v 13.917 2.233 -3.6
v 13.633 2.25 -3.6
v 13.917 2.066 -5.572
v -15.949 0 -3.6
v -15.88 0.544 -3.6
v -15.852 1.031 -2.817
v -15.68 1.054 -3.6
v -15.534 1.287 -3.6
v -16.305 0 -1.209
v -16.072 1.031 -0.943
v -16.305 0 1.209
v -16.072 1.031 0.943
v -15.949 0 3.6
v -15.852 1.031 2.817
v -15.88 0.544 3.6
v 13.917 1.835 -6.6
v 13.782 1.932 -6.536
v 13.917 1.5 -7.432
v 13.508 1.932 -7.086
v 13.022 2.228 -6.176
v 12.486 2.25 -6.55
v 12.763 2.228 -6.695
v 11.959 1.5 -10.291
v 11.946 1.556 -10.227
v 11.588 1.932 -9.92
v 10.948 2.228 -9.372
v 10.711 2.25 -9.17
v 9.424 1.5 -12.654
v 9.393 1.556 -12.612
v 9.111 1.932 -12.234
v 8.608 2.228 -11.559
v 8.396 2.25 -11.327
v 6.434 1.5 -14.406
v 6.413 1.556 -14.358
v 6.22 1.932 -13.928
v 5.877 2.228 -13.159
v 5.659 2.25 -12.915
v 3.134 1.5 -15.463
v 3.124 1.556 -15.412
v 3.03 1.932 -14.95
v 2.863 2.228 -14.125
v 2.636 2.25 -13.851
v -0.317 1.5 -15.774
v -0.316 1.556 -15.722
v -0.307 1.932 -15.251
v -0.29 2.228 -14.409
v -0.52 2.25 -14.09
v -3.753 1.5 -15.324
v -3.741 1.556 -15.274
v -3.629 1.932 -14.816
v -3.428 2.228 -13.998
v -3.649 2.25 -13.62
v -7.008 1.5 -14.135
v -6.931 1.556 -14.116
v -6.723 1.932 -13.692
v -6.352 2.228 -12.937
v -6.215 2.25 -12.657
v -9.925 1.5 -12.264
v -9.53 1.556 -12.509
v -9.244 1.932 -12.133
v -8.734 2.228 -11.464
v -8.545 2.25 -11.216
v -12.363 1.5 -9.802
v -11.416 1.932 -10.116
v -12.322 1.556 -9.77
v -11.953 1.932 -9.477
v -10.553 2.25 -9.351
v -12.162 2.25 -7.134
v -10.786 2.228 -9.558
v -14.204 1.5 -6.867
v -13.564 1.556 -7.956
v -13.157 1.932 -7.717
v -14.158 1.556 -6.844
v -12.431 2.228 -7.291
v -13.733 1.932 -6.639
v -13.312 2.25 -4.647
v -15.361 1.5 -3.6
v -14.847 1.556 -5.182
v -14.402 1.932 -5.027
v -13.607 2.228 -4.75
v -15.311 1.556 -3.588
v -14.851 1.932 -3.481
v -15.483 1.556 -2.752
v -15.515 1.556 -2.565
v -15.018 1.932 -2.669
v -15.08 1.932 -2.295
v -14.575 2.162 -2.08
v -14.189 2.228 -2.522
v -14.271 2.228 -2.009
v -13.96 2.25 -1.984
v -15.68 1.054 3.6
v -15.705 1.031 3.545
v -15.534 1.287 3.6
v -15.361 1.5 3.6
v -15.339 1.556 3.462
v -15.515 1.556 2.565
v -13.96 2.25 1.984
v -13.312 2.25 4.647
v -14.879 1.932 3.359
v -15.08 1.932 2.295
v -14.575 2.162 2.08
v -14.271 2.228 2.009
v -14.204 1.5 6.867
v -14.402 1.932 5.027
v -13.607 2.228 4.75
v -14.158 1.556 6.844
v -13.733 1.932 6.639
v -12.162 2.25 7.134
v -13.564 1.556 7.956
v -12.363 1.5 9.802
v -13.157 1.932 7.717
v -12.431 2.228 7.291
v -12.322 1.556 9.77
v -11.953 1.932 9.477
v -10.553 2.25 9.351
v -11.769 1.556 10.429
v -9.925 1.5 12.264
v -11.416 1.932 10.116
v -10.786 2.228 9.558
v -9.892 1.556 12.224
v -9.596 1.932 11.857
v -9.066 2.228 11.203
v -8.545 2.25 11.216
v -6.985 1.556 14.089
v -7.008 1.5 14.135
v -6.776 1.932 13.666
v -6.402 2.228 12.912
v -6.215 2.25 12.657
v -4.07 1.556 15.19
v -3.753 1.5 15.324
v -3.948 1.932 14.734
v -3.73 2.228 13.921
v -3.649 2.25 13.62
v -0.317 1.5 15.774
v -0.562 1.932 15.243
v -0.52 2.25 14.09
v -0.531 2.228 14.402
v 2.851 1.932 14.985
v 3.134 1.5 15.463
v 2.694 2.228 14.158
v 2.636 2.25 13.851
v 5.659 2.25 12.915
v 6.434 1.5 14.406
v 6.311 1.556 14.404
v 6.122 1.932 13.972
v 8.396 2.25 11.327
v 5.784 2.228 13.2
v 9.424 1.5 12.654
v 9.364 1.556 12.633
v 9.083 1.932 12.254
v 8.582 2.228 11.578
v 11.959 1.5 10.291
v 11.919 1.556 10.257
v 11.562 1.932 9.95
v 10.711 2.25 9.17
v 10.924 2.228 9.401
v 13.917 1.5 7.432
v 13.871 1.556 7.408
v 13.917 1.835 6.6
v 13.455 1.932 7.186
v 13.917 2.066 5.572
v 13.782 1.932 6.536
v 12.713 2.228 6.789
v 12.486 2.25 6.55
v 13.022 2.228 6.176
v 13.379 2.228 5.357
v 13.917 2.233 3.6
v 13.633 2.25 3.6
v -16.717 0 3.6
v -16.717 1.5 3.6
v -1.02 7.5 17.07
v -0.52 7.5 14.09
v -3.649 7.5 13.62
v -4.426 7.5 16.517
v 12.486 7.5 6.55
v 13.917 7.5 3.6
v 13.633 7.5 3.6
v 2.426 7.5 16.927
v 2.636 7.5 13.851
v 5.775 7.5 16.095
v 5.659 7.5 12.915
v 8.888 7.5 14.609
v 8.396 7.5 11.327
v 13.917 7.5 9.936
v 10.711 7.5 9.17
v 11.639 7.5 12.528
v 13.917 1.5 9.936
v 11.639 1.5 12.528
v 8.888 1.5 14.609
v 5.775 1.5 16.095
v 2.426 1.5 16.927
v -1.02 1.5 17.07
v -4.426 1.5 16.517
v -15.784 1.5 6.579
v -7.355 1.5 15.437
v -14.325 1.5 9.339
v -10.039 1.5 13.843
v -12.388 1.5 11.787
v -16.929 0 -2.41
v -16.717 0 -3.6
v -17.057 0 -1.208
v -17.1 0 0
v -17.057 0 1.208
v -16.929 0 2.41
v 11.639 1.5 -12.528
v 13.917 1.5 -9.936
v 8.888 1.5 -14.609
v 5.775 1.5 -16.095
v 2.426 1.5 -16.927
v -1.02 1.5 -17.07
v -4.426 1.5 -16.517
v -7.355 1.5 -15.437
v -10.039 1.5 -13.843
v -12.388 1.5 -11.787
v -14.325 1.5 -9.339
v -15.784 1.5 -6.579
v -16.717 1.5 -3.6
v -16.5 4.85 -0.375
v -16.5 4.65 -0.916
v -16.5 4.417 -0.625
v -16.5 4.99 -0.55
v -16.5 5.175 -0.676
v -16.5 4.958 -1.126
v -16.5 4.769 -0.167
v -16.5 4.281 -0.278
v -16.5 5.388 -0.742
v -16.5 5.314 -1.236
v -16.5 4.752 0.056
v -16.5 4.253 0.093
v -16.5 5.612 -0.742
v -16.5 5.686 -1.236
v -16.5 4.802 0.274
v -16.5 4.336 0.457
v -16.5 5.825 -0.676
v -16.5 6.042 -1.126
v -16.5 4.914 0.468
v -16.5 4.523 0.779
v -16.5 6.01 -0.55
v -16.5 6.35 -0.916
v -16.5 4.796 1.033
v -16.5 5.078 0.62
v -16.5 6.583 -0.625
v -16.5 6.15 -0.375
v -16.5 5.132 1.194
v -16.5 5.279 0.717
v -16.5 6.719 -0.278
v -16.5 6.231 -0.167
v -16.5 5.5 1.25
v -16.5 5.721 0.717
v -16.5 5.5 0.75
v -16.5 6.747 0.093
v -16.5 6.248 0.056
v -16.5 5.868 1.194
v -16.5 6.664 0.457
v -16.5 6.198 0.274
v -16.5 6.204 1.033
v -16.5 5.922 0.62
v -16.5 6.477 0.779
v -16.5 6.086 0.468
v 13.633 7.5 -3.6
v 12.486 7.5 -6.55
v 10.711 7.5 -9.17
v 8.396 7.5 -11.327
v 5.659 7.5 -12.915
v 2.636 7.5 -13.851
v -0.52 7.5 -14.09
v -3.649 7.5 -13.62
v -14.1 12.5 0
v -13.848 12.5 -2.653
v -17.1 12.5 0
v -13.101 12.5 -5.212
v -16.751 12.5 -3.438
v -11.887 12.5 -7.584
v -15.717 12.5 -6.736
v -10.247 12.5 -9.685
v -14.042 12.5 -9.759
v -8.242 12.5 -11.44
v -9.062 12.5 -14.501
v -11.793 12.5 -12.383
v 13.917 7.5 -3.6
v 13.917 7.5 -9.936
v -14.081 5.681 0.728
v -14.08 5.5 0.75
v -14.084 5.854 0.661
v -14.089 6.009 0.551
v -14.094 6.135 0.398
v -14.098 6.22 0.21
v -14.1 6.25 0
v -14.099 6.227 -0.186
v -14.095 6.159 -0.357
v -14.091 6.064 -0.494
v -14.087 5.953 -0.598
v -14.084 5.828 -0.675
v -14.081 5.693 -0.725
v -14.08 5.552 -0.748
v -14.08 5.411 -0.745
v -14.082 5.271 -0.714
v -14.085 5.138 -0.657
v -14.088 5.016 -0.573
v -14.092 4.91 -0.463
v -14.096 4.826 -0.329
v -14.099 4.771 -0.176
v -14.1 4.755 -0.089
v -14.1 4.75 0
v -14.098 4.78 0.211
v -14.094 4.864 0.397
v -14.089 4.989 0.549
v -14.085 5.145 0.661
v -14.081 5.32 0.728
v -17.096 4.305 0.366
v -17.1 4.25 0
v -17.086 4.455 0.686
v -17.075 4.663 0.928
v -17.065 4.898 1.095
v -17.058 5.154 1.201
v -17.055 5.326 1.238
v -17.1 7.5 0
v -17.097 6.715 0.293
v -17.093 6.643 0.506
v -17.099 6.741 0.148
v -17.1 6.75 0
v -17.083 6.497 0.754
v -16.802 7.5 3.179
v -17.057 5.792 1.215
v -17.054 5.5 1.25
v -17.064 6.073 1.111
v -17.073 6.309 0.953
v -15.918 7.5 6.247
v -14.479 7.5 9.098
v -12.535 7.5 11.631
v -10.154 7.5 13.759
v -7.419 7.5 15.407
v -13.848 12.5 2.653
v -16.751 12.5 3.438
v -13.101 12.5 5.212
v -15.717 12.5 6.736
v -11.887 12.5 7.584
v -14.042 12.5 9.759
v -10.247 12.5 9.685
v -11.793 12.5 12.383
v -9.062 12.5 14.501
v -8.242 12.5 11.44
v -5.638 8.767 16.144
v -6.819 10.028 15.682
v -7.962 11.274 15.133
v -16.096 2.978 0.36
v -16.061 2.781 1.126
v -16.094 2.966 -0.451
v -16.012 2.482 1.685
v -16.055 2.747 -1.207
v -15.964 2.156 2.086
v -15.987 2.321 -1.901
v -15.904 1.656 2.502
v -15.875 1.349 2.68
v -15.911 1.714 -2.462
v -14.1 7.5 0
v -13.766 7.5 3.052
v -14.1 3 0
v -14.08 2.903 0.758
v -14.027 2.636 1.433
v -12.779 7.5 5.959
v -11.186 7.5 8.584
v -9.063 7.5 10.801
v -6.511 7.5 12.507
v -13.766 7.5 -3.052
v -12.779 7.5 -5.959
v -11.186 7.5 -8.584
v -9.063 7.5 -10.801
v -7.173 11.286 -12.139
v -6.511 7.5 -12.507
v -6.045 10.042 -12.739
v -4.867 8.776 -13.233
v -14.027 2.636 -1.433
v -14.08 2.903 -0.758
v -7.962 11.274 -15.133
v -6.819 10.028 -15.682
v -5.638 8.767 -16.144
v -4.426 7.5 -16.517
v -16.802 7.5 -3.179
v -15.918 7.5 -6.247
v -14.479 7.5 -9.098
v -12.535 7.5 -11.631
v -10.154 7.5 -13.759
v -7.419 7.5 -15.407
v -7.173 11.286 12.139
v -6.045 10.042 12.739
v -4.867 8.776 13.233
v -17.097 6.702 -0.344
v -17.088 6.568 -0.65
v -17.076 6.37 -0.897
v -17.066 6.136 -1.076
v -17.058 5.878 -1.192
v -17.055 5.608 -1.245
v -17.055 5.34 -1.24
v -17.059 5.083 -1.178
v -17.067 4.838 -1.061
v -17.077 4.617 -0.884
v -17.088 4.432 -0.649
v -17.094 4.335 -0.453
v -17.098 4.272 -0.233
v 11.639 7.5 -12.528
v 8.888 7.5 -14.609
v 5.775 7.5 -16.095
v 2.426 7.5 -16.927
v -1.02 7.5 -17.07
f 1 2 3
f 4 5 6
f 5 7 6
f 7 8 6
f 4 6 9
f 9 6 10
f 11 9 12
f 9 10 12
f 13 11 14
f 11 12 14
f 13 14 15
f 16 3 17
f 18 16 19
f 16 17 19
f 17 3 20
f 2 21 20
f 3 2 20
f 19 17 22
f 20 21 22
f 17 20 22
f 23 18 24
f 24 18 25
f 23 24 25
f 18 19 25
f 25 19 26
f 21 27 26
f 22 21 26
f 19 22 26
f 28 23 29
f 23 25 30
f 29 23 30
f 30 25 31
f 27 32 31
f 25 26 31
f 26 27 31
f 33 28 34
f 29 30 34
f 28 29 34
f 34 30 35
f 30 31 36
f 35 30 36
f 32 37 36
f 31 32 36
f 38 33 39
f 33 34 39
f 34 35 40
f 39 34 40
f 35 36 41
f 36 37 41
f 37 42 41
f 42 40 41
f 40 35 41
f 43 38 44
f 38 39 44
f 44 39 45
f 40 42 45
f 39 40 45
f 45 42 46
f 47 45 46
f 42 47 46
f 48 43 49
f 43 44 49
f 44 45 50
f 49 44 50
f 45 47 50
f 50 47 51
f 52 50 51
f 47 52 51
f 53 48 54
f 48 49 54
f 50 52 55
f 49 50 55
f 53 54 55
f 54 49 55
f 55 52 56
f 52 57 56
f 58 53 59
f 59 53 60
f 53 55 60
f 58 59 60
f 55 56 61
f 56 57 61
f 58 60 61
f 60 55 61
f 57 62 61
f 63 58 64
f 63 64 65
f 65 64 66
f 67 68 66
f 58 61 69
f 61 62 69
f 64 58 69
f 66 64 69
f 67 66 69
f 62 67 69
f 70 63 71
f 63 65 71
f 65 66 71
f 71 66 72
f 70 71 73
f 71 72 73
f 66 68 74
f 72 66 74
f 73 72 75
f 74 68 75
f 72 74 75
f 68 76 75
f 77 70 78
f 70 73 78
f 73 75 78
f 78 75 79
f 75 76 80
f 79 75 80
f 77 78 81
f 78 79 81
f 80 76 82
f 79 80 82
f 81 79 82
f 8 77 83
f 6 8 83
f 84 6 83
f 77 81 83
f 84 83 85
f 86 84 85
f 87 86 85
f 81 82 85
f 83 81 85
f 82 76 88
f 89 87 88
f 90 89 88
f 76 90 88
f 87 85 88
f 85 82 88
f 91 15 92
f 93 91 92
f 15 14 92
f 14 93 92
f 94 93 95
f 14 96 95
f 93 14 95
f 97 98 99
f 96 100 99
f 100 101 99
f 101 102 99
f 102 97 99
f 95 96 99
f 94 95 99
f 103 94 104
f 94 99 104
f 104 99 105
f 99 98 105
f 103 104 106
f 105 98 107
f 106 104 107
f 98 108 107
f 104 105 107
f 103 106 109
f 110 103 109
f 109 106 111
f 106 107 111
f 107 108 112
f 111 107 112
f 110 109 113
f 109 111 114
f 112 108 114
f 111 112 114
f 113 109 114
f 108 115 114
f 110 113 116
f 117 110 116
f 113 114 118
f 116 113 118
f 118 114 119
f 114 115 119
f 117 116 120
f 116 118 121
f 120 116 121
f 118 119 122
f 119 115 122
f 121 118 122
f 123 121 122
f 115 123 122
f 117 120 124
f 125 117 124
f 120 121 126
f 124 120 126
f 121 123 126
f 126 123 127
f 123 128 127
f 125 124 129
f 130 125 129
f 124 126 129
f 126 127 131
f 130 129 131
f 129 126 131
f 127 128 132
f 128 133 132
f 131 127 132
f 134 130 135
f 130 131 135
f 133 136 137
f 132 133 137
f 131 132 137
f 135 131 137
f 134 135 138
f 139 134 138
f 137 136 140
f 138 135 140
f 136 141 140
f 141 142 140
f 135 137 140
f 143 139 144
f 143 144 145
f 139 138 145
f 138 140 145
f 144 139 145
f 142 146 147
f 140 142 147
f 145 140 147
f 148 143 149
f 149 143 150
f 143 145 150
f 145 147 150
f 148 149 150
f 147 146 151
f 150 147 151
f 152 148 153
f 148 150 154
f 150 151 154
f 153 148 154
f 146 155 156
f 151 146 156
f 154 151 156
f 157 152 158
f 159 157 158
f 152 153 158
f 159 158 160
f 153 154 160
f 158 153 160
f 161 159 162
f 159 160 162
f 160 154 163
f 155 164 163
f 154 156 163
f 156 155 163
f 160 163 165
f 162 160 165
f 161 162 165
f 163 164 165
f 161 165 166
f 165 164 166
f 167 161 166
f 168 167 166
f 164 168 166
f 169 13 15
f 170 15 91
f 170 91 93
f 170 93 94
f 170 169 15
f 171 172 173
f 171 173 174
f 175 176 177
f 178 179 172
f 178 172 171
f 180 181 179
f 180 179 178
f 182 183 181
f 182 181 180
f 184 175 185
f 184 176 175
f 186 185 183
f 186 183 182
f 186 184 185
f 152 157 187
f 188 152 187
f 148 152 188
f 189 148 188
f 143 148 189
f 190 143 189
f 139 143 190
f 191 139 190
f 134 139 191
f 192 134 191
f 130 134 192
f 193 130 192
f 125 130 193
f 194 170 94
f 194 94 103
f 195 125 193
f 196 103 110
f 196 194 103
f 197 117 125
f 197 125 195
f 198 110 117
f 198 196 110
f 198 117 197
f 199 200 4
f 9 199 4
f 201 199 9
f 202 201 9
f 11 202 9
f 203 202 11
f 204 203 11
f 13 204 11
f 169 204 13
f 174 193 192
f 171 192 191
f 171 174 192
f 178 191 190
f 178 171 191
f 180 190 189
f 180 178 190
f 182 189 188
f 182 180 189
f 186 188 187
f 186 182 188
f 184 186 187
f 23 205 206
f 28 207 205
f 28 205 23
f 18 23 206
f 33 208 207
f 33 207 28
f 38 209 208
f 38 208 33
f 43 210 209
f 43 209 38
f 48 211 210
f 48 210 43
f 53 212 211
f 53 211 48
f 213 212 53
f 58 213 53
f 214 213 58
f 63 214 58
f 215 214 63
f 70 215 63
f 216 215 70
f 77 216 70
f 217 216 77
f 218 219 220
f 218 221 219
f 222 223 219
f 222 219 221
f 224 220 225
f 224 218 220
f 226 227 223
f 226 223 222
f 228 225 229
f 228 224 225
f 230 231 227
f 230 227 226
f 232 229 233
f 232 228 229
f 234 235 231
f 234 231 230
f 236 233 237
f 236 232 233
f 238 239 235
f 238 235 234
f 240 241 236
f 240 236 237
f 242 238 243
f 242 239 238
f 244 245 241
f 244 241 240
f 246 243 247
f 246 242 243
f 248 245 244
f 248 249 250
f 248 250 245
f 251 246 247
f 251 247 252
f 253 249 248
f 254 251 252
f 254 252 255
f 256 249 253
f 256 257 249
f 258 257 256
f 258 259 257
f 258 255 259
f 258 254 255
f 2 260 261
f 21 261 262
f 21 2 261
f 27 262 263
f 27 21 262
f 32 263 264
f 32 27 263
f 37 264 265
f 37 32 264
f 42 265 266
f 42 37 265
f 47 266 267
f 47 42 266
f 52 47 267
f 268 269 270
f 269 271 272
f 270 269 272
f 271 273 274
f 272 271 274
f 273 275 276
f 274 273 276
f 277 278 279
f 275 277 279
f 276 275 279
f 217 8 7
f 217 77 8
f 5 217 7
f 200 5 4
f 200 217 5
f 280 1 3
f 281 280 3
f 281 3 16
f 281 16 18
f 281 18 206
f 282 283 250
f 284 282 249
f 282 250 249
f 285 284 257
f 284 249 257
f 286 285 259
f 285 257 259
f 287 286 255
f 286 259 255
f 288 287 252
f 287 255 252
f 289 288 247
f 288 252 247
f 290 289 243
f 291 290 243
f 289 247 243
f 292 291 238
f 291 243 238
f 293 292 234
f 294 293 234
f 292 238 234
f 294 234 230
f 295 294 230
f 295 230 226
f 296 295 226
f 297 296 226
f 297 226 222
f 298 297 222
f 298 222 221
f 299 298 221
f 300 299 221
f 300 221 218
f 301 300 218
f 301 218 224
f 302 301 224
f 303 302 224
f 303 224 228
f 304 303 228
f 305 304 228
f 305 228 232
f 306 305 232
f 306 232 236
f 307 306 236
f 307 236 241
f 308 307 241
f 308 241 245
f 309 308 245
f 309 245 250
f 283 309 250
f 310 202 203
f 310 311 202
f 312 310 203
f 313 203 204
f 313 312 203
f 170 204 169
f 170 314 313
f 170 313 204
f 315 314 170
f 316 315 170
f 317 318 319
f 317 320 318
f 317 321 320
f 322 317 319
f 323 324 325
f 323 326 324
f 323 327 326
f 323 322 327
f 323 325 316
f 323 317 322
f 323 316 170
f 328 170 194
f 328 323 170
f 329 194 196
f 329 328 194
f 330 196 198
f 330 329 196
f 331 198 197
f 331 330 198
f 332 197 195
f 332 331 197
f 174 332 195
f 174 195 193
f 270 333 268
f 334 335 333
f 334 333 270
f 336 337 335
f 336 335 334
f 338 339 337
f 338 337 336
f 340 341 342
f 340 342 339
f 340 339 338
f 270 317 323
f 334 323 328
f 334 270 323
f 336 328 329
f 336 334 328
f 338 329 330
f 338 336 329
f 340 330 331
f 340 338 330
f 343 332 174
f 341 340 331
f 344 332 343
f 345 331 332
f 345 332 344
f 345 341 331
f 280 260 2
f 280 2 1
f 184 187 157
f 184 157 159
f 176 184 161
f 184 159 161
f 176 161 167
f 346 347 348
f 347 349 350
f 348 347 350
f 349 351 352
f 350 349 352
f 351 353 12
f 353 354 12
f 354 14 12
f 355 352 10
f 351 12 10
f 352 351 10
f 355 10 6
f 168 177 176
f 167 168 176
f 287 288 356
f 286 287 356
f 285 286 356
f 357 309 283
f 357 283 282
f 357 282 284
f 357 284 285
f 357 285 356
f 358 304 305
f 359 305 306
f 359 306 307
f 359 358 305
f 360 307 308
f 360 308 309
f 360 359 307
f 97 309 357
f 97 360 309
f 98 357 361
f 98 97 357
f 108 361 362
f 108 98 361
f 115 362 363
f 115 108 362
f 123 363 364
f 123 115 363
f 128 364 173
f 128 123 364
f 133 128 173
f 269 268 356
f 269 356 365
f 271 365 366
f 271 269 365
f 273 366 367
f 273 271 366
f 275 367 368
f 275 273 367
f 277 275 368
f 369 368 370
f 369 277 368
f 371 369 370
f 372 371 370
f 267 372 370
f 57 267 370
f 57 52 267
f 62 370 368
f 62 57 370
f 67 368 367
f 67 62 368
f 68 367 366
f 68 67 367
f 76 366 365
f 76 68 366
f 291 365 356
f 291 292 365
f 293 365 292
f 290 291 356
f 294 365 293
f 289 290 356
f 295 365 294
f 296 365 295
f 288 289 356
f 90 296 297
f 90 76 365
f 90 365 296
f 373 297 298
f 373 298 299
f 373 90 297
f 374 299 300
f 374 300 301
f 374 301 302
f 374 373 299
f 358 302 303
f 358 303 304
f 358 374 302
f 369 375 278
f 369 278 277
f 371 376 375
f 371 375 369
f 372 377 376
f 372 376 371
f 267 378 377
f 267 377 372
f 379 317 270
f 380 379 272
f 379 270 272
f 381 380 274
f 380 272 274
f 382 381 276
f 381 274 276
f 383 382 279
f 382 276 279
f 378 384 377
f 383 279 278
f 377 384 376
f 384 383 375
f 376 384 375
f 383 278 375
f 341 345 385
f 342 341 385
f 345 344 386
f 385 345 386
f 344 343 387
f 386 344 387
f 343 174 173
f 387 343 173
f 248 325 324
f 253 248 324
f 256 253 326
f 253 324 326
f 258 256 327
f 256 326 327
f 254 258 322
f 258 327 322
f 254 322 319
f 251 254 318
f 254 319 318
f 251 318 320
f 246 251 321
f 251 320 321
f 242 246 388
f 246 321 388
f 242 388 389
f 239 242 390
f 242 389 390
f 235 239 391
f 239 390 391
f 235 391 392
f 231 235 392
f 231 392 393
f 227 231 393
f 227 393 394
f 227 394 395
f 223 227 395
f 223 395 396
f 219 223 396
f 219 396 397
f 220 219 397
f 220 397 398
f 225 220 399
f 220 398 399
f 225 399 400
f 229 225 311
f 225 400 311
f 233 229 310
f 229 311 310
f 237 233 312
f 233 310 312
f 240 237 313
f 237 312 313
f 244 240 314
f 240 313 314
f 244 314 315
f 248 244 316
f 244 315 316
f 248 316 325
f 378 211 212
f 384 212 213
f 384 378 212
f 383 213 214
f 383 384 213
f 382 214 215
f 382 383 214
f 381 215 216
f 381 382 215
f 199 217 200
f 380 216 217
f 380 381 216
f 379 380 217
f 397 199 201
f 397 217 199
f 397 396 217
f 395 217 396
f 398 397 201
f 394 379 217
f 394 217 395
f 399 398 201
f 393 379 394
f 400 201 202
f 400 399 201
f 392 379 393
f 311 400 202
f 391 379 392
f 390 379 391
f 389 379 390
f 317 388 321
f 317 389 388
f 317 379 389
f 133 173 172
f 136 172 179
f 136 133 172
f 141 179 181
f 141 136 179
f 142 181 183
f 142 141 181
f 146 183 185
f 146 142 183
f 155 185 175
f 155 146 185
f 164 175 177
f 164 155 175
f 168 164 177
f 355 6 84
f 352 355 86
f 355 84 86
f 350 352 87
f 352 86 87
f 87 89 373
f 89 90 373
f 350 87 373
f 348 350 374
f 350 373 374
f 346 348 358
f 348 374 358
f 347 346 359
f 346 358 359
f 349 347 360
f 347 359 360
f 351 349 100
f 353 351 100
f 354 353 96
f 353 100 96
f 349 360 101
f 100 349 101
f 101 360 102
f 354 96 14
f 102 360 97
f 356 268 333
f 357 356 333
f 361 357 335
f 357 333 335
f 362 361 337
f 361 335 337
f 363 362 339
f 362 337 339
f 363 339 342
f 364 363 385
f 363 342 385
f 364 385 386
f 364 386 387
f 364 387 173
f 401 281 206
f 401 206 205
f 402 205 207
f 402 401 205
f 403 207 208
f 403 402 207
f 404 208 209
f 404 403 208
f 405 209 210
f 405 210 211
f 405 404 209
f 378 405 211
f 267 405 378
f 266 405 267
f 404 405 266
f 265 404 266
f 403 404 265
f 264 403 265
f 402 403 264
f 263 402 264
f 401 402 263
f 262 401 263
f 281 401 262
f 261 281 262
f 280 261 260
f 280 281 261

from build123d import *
from build123d.topology import SkipClean

# Parameters (mm, degrees)
CROQUIS1_R                 = 17.1
CROQUIS1_R_2               = 14.1
SALIENTE_EXTRUIR1_DEPTH    = 7.5
CORTAR_EXTRUIR1_REACH      = 30.457
CROQUIS2_W                 = 15.420651877
CROQUIS2_H                 = 7.2
CROQUIS54_W                = 3
CROQUIS54_H                = 25
REVOLUCI_N1_ANGLE          = 150
CORTAR_BARRER2_PROFILE_R   = 2.25
CHAFL_N3_SIZE              = 5
CORTAR_EXTRUIR2_REACH      = 29.223
CORTAR_EXTRUIR2_END_RADIUS = 16.1
CROQUIS61_R                = 3
CORTAR_EXTRUIR3_START      = -17.1
CORTAR_EXTRUIR3_DEPTH      = 33.816758059
CROQUIS63_R                = 0.75
CORTAR_EXTRUIR4_DEPTH      = 10
CROQUIS64_R                = 1.25
CORTAR_EXTRUIR5_DEPTH      = 0.6
CORTAR_EXTRUIR6_START      = -6
CROQUIS65_W                = 2.8
CROQUIS65_H                = 19.872981168
CORTAR_EXTRUIR6_DEPTH      = 11


# Read off the part's stored shape, not the designer's step: Cortar-Extruir3
with BuildPart() as part:
    # Croquis1 → Saliente-Extruir1 (new, symmetric)
    with BuildSketch(Plane(origin=(0, 0, 0), x_dir=(1, 0, 0), z_dir=(0, 1, 0))):
        with Locations(Location((0, 0, 0), (0, 0, 270))):
            Circle(CROQUIS1_R)
        with Locations(Location((0, 0, 0), (0, 0, 270))):
            Circle(CROQUIS1_R_2, mode=Mode.SUBTRACT)
    extrude(amount=SALIENTE_EXTRUIR1_DEPTH, both=True)

    # Croquis2 → Cortar-Extruir1 (cut, up to next)
    with BuildSketch(Plane(origin=(0, 7.5, 0), x_dir=(1, 0, 0), z_dir=(0, 1, 0)), mode=Mode.PRIVATE) as cortar_extruir1_sk1:
        with Locations((15.870282115, 0)):
            Rectangle(CROQUIS2_W, CROQUIS2_H)
    cortar_extruir1_tool1 = extrude(cortar_extruir1_sk1.sketch, amount=-CORTAR_EXTRUIR1_REACH, mode=Mode.PRIVATE) & part.part
    add(cortar_extruir1_tool1.solids().sort_by_distance((15.870282, 7.5, 0))[0], mode=Mode.SUBTRACT)

    # Croquis54 → Revolución1 (revolve, symmetric)
    with SkipClean():  # the faces are left unmerged after this step: merging them gives an invalid solid
        with BuildSketch(Plane.XY) as revoluci_n1_sk:
            with Locations((-15.6, 0)):
                Rectangle(CROQUIS54_W, CROQUIS54_H)
        revolve(axis=Axis((0, -13.582020258, 0), (0, 1, 0)), revolution_arc=REVOLUCI_N1_ANGLE / 2)
        revolve(revoluci_n1_sk.sketch, axis=Axis((0, -13.582020258, 0), (0, -1, 0)), revolution_arc=REVOLUCI_N1_ANGLE / 2)
    add(part.part.scale(1), mode=Mode.REPLACE)  # the faces are merged on a copy

    # Cortar-Barrer2: sweep along a path in Croquis12
    with BuildLine(Plane(origin=(0, 0, 0), x_dir=(1, 0, 0), z_dir=(0, 1, 0))) as cortar_barrer2_path:
        CenterArc((0, 0), 14.1, 0, 360)
    # Cortar-Barrer2 profile (on start of the path) → Cortar-Barrer2 (sweep, cut)
    with BuildSketch(Plane(origin=(14.1, 0, 0), x_dir=(-1, 0, 0), z_dir=(0, 0, -1))):
        Circle(CORTAR_BARRER2_PROFILE_R)
    sweep(path=cortar_barrer2_path.line, mode=Mode.SUBTRACT)

    # Chaflán3
    chafl_n3_edges = [part.edges().sort_by_distance(p)[0] for p in [
        (-4.037577104, -12.5, -15.06844289),
        (-4.037577104, 12.5, -15.06844289),
        (-4.037577104, -12.5, 15.06844289),
        (-4.037577104, 12.5, 15.06844289),
    ]]
    chamfer(chafl_n3_edges, length=CHAFL_N3_SIZE - 0.0001)  # a hair under: the kernel refuses the full size

    # Cortar-Extruir2: up to this cylinder (the profile starts inside it)
    cortar_extruir2_end = Plane(origin=(0, 0, 0), z_dir=(0, -1, 0)) * Cylinder(CORTAR_EXTRUIR2_END_RADIUS, 91.646, mode=Mode.PRIVATE)
    # Croquis61 → Cortar-Extruir2 (cut, up to the surface)
    with BuildSketch(Plane(origin=(0, 0, 0), x_dir=(0, 0, -1), z_dir=(1, 0, 0)), mode=Mode.PRIVATE) as cortar_extruir2_sk1:
        Circle(CROQUIS61_R)
    cortar_extruir2_tool1 = extrude(cortar_extruir2_sk1.sketch, amount=-CORTAR_EXTRUIR2_REACH, mode=Mode.PRIVATE) & cortar_extruir2_end
    add(cortar_extruir2_tool1.solids().sort_by_distance((0, 0, 0))[0], mode=Mode.SUBTRACT)

    # Cortar-Extruir3 outline → Cortar-Extruir3 (cut)
    with BuildSketch(Plane(origin=(0, 0, 0), x_dir=(0, 0, -1), z_dir=(1, 0, 0)).offset(CORTAR_EXTRUIR3_START)):
        Polygon((3.6, 0), (-3.6, 0), (-3.6, 1.5), (-20.692074401, 1.5), (-20.692074401, -12.752391624), (19.353781031, -12.752391624), (19.353781031, 1.5), (3.6, 1.5), align=None)
    extrude(amount=CORTAR_EXTRUIR3_DEPTH, mode=Mode.SUBTRACT)

    # Croquis63 → Cortar-Extruir4 (cut)
    with SkipClean():  # the faces are left unmerged after this step: merging them gives an invalid solid
        with BuildSketch(Plane(origin=(-17.1, 0, 0), x_dir=(0, -1, 0), z_dir=(-1, 0, 0))):
            with Locations(Location((-5.5, 0, 0), (0, 0, 90))):
                Circle(CROQUIS63_R)
        extrude(amount=-CORTAR_EXTRUIR4_DEPTH, mode=Mode.SUBTRACT)

    # Croquis64 → Cortar-Extruir5 (cut)
    with SkipClean():  # the faces are left unmerged after this step: merging them gives an invalid solid
        with BuildSketch(Plane(origin=(-17.1, 0, 0), x_dir=(0, -1, 0), z_dir=(-1, 0, 0))):
            with Locations(Location((-5.5, 0, 0), (0, 0, 90))):
                Circle(CROQUIS64_R)
        extrude(amount=-CORTAR_EXTRUIR5_DEPTH, mode=Mode.SUBTRACT)

    # Croquis65 → Cortar-Extruir6 (cut)
    with SkipClean():  # the faces are left unmerged after this step: merging them gives an invalid solid
        with BuildSketch(Plane(origin=(0, 7.5, 0), x_dir=(1, 0, 0), z_dir=(0, 1, 0)).offset(CORTAR_EXTRUIR6_START)):
            with Locations((15.316758059, 0)):
                Rectangle(CROQUIS65_W, CROQUIS65_H)
        extrude(amount=CORTAR_EXTRUIR6_DEPTH, mode=Mode.SUBTRACT)


solid = part.part
